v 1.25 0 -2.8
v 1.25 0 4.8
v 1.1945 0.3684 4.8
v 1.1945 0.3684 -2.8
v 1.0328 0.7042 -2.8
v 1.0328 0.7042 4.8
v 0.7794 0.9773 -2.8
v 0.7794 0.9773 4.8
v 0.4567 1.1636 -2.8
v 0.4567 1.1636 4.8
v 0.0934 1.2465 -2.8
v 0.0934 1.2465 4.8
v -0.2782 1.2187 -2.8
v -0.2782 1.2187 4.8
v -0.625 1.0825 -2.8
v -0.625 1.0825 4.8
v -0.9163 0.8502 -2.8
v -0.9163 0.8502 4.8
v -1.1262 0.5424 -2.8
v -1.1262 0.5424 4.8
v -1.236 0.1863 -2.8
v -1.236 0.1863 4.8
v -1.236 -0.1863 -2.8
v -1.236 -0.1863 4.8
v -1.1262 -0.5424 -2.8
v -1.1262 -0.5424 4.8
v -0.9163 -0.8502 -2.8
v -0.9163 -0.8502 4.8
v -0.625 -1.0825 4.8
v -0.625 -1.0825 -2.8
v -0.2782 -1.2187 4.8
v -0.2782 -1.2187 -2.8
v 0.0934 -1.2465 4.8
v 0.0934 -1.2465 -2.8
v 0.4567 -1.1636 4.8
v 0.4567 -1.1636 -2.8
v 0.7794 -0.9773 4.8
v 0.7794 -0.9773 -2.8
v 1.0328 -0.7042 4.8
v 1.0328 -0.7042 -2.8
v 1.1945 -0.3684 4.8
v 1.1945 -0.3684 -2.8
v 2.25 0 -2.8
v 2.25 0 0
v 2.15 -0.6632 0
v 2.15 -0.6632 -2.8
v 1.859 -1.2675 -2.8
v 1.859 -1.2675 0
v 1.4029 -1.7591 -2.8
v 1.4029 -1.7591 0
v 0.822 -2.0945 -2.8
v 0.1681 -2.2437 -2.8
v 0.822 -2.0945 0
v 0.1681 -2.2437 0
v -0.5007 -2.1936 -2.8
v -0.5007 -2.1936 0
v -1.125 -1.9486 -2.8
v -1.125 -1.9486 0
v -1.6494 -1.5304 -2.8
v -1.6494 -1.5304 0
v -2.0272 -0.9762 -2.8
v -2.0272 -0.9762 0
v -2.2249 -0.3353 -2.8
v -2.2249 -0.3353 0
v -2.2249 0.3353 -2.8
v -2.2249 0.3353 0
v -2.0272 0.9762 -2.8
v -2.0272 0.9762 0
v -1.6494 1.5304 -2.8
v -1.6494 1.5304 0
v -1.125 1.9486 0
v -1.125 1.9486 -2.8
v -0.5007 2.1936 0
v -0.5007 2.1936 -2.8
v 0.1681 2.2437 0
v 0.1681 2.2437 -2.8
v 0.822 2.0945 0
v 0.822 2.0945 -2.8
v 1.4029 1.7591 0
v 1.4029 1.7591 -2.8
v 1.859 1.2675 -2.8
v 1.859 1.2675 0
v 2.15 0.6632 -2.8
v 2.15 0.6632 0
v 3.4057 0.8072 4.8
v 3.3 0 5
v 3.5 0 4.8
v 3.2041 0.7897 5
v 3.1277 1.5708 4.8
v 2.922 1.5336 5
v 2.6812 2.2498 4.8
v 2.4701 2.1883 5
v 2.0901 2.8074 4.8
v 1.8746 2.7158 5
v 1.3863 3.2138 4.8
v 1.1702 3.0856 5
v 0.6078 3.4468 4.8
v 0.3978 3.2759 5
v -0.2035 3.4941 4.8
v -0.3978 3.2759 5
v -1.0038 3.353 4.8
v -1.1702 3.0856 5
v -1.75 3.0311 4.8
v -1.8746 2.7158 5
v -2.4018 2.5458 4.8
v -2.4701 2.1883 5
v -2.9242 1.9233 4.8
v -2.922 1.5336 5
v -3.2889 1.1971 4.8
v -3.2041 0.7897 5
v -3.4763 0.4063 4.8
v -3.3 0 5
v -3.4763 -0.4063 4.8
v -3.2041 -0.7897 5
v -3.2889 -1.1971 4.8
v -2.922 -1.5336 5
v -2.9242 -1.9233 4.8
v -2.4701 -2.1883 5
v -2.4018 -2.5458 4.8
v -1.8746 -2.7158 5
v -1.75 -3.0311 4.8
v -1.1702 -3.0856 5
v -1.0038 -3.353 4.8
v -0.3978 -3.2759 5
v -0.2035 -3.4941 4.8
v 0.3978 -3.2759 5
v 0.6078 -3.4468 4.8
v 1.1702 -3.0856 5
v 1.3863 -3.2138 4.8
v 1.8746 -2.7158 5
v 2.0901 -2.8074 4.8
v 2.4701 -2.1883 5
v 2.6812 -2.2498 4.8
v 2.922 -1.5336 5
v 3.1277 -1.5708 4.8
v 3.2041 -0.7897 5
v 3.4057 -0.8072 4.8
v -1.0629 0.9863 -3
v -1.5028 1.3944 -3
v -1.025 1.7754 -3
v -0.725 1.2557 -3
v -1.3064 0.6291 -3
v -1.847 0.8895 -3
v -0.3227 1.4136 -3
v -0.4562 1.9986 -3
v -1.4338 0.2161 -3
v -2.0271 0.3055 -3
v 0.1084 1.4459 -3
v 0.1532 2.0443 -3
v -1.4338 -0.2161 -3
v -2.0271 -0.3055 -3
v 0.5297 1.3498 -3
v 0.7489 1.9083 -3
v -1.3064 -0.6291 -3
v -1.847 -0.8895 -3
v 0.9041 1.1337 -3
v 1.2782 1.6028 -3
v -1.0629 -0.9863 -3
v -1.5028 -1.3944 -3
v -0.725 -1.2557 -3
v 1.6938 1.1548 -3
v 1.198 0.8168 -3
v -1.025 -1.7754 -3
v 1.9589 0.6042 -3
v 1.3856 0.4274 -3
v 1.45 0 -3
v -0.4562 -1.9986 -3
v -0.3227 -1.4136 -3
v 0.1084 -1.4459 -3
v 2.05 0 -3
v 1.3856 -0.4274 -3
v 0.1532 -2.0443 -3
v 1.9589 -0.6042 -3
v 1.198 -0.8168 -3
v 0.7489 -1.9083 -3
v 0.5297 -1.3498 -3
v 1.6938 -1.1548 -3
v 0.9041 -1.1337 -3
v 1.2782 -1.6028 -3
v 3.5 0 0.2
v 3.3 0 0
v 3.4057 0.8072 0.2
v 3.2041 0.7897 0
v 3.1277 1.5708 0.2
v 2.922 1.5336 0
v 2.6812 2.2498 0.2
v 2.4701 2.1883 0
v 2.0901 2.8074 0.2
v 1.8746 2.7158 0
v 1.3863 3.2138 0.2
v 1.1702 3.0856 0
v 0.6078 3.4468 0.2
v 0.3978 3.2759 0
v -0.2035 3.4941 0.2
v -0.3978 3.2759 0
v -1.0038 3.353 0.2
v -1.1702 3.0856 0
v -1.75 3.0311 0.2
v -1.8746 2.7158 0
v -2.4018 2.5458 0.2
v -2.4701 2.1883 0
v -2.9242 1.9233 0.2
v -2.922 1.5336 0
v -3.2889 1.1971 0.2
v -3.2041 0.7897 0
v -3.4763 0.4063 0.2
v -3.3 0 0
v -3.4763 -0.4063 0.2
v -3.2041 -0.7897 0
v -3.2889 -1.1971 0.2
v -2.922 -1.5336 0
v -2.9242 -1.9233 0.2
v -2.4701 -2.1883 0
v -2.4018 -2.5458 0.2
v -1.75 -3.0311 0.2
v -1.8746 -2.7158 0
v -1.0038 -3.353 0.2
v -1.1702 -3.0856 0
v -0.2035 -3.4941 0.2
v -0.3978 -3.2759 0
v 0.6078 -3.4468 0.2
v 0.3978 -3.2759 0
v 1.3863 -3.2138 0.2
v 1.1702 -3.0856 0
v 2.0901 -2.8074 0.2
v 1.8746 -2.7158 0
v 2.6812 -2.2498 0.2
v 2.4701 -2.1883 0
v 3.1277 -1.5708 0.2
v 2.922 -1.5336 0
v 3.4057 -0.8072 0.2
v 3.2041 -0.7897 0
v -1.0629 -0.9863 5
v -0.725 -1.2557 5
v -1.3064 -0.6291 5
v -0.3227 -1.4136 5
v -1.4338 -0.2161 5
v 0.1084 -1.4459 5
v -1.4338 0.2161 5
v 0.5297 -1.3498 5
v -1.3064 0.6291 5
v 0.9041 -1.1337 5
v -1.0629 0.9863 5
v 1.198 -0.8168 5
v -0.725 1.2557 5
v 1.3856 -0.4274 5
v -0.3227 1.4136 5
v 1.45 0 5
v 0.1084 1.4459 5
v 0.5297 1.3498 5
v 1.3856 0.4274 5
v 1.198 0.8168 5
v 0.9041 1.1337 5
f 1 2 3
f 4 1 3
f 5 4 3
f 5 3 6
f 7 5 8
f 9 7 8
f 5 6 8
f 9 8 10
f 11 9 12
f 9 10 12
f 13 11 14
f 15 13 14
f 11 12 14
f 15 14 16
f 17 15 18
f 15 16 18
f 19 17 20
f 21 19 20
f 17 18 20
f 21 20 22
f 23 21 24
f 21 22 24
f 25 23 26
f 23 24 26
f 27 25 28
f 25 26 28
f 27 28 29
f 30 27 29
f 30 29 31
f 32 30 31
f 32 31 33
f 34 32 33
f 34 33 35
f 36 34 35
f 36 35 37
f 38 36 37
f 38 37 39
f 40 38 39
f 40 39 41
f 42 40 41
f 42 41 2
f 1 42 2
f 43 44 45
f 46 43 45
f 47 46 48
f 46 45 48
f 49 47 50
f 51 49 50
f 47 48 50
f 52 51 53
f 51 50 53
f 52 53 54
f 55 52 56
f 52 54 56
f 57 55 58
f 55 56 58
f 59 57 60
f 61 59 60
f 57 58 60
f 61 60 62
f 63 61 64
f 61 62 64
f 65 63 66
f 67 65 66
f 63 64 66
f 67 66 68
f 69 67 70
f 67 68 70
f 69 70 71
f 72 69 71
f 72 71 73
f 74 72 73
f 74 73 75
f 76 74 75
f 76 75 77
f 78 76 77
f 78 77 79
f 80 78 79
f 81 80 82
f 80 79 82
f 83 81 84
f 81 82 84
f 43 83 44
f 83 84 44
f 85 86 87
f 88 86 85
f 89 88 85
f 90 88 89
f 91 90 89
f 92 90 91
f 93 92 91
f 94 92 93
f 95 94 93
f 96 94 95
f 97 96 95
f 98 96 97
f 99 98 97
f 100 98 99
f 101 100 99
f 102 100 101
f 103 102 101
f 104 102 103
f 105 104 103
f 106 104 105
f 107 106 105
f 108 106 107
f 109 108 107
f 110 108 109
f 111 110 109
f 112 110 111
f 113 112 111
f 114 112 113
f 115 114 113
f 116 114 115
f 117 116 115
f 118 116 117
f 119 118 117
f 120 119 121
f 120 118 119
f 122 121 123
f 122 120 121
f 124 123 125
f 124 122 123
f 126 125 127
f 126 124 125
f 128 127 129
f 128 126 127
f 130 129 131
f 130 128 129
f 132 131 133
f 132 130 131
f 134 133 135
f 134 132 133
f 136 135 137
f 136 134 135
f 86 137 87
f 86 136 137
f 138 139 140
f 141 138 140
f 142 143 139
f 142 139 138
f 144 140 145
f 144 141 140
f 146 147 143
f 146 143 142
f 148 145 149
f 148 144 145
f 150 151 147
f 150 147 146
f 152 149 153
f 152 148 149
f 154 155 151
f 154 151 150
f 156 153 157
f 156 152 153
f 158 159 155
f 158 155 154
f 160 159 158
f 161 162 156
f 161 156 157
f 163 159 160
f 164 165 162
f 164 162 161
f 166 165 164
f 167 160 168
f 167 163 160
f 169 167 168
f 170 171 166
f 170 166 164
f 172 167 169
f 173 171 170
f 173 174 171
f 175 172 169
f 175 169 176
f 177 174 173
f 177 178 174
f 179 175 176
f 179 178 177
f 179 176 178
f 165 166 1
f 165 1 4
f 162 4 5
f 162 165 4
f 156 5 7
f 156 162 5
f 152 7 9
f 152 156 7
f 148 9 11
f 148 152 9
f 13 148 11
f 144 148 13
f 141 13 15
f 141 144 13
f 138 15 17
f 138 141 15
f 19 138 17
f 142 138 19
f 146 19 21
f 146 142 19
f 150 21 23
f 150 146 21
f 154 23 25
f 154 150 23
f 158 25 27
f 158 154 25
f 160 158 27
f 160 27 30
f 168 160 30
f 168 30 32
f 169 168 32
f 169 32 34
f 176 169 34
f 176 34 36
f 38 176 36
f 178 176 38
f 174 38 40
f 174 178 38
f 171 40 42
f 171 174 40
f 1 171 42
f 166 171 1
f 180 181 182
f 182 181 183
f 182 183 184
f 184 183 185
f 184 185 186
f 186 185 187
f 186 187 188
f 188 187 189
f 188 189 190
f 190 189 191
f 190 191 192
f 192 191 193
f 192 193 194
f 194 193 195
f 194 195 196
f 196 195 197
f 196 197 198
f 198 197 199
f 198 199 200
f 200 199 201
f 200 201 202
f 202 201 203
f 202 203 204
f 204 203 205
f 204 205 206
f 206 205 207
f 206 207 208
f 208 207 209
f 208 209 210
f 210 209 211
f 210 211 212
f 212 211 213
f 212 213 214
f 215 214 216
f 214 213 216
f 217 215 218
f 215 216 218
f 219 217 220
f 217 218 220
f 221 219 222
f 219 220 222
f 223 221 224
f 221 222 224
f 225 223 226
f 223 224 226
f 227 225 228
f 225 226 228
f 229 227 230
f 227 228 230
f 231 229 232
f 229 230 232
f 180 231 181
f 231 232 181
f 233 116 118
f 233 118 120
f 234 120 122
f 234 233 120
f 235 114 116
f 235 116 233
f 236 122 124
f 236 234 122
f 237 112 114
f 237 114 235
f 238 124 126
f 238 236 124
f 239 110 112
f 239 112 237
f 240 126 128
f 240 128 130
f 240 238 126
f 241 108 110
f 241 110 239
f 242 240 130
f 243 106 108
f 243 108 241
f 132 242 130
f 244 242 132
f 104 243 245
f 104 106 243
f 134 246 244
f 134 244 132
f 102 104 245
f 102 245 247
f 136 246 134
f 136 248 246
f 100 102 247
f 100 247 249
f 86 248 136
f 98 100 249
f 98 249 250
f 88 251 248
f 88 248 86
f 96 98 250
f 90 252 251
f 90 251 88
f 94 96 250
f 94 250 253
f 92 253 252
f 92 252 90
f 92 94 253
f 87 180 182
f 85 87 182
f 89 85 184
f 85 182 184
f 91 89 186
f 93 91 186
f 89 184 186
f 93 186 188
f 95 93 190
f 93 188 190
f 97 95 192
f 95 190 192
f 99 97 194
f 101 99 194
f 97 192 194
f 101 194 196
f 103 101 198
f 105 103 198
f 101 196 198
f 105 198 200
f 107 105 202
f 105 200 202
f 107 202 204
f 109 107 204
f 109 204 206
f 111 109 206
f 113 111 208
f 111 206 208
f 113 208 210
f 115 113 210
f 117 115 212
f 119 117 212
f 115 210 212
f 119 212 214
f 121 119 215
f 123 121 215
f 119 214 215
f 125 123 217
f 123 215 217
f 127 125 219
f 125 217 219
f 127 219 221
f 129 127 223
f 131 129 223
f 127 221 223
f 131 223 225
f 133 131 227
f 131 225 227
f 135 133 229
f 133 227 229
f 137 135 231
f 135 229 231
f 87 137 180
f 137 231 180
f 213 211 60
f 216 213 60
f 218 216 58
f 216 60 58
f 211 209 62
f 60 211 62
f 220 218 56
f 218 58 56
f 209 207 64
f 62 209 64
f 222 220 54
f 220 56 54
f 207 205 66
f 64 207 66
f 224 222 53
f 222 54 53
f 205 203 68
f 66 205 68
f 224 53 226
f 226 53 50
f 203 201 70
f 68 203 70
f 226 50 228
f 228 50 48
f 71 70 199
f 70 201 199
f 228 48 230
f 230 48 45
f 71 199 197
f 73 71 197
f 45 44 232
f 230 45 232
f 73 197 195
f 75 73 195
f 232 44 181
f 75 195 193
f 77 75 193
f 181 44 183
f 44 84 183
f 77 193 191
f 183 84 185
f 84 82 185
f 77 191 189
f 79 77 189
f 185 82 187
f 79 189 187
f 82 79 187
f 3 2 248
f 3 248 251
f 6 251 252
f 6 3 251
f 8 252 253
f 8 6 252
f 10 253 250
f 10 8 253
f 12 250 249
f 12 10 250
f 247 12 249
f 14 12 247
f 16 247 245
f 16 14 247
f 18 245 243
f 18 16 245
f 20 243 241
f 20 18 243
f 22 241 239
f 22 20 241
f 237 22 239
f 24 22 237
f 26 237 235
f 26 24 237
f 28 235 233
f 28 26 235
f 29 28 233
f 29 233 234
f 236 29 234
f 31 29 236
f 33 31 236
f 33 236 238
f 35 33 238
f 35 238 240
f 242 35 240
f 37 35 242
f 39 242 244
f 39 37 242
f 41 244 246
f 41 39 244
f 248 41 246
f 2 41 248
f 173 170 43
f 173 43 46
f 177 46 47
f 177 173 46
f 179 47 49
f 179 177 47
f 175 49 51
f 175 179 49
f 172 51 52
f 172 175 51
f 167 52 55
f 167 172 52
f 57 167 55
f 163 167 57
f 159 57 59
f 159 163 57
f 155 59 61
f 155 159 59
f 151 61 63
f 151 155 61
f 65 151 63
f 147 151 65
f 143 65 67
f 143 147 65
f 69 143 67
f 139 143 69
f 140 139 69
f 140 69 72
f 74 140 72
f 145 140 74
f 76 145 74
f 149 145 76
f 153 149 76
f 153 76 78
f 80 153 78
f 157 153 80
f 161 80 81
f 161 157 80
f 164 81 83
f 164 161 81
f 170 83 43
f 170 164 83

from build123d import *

# Parameters (mm, degrees)
SKETCH_1_R          = 3.5
EXTRUDE_1_DEPTH     = 5
SKETCH_2_R          = 2.25
EXTRUDE_2_DEPTH     = 3
CHAMFER_1_SIZE      = 0.2
SKETCH_4_R          = 1.25
CUT_EXTRUDE_1_DEPTH = 9
CHAMFER_2_SIZE      = 0.2


with BuildPart() as part:
    # Эскиз1 → Бобышка-Вытянуть1 (new body)
    with BuildSketch(Plane.XY):
        Circle(SKETCH_1_R)
    extrude(amount=EXTRUDE_1_DEPTH)

    # Эскиз2 → Бобышка-Вытянуть2 (add)
    with BuildSketch(Plane(origin=(0, 0, 0), x_dir=(-1, 0, 0), z_dir=(0, 0, -1))):
        with Locations(Location((0, 0, 0), (0, 0, 180))):
            Circle(SKETCH_2_R)
    extrude(amount=EXTRUDE_2_DEPTH)

    # Фаска1
    chamfer_1_edges = [part.edges().sort_by_distance(p)[0] for p in [
        (-3.5, 0, 0),
        (-3.5, 0, 5),
        (-2.25, 0, -3),
    ]]
    chamfer(chamfer_1_edges, length=CHAMFER_1_SIZE)

    # Эскиз4 → Вырез-Вытянуть1 (cut)
    with BuildSketch(Plane.XY.offset(5)):
        Circle(SKETCH_4_R)
    extrude(amount=-CUT_EXTRUDE_1_DEPTH, mode=Mode.SUBTRACT)

    # Фаска2
    chamfer_2_edges = [part.edges().sort_by_distance(p)[0] for p in [
        (-1.25, 0, -3),
        (-1.25, 0, 5),
    ]]
    chamfer(chamfer_2_edges, length=CHAMFER_2_SIZE)


solid = part.part
